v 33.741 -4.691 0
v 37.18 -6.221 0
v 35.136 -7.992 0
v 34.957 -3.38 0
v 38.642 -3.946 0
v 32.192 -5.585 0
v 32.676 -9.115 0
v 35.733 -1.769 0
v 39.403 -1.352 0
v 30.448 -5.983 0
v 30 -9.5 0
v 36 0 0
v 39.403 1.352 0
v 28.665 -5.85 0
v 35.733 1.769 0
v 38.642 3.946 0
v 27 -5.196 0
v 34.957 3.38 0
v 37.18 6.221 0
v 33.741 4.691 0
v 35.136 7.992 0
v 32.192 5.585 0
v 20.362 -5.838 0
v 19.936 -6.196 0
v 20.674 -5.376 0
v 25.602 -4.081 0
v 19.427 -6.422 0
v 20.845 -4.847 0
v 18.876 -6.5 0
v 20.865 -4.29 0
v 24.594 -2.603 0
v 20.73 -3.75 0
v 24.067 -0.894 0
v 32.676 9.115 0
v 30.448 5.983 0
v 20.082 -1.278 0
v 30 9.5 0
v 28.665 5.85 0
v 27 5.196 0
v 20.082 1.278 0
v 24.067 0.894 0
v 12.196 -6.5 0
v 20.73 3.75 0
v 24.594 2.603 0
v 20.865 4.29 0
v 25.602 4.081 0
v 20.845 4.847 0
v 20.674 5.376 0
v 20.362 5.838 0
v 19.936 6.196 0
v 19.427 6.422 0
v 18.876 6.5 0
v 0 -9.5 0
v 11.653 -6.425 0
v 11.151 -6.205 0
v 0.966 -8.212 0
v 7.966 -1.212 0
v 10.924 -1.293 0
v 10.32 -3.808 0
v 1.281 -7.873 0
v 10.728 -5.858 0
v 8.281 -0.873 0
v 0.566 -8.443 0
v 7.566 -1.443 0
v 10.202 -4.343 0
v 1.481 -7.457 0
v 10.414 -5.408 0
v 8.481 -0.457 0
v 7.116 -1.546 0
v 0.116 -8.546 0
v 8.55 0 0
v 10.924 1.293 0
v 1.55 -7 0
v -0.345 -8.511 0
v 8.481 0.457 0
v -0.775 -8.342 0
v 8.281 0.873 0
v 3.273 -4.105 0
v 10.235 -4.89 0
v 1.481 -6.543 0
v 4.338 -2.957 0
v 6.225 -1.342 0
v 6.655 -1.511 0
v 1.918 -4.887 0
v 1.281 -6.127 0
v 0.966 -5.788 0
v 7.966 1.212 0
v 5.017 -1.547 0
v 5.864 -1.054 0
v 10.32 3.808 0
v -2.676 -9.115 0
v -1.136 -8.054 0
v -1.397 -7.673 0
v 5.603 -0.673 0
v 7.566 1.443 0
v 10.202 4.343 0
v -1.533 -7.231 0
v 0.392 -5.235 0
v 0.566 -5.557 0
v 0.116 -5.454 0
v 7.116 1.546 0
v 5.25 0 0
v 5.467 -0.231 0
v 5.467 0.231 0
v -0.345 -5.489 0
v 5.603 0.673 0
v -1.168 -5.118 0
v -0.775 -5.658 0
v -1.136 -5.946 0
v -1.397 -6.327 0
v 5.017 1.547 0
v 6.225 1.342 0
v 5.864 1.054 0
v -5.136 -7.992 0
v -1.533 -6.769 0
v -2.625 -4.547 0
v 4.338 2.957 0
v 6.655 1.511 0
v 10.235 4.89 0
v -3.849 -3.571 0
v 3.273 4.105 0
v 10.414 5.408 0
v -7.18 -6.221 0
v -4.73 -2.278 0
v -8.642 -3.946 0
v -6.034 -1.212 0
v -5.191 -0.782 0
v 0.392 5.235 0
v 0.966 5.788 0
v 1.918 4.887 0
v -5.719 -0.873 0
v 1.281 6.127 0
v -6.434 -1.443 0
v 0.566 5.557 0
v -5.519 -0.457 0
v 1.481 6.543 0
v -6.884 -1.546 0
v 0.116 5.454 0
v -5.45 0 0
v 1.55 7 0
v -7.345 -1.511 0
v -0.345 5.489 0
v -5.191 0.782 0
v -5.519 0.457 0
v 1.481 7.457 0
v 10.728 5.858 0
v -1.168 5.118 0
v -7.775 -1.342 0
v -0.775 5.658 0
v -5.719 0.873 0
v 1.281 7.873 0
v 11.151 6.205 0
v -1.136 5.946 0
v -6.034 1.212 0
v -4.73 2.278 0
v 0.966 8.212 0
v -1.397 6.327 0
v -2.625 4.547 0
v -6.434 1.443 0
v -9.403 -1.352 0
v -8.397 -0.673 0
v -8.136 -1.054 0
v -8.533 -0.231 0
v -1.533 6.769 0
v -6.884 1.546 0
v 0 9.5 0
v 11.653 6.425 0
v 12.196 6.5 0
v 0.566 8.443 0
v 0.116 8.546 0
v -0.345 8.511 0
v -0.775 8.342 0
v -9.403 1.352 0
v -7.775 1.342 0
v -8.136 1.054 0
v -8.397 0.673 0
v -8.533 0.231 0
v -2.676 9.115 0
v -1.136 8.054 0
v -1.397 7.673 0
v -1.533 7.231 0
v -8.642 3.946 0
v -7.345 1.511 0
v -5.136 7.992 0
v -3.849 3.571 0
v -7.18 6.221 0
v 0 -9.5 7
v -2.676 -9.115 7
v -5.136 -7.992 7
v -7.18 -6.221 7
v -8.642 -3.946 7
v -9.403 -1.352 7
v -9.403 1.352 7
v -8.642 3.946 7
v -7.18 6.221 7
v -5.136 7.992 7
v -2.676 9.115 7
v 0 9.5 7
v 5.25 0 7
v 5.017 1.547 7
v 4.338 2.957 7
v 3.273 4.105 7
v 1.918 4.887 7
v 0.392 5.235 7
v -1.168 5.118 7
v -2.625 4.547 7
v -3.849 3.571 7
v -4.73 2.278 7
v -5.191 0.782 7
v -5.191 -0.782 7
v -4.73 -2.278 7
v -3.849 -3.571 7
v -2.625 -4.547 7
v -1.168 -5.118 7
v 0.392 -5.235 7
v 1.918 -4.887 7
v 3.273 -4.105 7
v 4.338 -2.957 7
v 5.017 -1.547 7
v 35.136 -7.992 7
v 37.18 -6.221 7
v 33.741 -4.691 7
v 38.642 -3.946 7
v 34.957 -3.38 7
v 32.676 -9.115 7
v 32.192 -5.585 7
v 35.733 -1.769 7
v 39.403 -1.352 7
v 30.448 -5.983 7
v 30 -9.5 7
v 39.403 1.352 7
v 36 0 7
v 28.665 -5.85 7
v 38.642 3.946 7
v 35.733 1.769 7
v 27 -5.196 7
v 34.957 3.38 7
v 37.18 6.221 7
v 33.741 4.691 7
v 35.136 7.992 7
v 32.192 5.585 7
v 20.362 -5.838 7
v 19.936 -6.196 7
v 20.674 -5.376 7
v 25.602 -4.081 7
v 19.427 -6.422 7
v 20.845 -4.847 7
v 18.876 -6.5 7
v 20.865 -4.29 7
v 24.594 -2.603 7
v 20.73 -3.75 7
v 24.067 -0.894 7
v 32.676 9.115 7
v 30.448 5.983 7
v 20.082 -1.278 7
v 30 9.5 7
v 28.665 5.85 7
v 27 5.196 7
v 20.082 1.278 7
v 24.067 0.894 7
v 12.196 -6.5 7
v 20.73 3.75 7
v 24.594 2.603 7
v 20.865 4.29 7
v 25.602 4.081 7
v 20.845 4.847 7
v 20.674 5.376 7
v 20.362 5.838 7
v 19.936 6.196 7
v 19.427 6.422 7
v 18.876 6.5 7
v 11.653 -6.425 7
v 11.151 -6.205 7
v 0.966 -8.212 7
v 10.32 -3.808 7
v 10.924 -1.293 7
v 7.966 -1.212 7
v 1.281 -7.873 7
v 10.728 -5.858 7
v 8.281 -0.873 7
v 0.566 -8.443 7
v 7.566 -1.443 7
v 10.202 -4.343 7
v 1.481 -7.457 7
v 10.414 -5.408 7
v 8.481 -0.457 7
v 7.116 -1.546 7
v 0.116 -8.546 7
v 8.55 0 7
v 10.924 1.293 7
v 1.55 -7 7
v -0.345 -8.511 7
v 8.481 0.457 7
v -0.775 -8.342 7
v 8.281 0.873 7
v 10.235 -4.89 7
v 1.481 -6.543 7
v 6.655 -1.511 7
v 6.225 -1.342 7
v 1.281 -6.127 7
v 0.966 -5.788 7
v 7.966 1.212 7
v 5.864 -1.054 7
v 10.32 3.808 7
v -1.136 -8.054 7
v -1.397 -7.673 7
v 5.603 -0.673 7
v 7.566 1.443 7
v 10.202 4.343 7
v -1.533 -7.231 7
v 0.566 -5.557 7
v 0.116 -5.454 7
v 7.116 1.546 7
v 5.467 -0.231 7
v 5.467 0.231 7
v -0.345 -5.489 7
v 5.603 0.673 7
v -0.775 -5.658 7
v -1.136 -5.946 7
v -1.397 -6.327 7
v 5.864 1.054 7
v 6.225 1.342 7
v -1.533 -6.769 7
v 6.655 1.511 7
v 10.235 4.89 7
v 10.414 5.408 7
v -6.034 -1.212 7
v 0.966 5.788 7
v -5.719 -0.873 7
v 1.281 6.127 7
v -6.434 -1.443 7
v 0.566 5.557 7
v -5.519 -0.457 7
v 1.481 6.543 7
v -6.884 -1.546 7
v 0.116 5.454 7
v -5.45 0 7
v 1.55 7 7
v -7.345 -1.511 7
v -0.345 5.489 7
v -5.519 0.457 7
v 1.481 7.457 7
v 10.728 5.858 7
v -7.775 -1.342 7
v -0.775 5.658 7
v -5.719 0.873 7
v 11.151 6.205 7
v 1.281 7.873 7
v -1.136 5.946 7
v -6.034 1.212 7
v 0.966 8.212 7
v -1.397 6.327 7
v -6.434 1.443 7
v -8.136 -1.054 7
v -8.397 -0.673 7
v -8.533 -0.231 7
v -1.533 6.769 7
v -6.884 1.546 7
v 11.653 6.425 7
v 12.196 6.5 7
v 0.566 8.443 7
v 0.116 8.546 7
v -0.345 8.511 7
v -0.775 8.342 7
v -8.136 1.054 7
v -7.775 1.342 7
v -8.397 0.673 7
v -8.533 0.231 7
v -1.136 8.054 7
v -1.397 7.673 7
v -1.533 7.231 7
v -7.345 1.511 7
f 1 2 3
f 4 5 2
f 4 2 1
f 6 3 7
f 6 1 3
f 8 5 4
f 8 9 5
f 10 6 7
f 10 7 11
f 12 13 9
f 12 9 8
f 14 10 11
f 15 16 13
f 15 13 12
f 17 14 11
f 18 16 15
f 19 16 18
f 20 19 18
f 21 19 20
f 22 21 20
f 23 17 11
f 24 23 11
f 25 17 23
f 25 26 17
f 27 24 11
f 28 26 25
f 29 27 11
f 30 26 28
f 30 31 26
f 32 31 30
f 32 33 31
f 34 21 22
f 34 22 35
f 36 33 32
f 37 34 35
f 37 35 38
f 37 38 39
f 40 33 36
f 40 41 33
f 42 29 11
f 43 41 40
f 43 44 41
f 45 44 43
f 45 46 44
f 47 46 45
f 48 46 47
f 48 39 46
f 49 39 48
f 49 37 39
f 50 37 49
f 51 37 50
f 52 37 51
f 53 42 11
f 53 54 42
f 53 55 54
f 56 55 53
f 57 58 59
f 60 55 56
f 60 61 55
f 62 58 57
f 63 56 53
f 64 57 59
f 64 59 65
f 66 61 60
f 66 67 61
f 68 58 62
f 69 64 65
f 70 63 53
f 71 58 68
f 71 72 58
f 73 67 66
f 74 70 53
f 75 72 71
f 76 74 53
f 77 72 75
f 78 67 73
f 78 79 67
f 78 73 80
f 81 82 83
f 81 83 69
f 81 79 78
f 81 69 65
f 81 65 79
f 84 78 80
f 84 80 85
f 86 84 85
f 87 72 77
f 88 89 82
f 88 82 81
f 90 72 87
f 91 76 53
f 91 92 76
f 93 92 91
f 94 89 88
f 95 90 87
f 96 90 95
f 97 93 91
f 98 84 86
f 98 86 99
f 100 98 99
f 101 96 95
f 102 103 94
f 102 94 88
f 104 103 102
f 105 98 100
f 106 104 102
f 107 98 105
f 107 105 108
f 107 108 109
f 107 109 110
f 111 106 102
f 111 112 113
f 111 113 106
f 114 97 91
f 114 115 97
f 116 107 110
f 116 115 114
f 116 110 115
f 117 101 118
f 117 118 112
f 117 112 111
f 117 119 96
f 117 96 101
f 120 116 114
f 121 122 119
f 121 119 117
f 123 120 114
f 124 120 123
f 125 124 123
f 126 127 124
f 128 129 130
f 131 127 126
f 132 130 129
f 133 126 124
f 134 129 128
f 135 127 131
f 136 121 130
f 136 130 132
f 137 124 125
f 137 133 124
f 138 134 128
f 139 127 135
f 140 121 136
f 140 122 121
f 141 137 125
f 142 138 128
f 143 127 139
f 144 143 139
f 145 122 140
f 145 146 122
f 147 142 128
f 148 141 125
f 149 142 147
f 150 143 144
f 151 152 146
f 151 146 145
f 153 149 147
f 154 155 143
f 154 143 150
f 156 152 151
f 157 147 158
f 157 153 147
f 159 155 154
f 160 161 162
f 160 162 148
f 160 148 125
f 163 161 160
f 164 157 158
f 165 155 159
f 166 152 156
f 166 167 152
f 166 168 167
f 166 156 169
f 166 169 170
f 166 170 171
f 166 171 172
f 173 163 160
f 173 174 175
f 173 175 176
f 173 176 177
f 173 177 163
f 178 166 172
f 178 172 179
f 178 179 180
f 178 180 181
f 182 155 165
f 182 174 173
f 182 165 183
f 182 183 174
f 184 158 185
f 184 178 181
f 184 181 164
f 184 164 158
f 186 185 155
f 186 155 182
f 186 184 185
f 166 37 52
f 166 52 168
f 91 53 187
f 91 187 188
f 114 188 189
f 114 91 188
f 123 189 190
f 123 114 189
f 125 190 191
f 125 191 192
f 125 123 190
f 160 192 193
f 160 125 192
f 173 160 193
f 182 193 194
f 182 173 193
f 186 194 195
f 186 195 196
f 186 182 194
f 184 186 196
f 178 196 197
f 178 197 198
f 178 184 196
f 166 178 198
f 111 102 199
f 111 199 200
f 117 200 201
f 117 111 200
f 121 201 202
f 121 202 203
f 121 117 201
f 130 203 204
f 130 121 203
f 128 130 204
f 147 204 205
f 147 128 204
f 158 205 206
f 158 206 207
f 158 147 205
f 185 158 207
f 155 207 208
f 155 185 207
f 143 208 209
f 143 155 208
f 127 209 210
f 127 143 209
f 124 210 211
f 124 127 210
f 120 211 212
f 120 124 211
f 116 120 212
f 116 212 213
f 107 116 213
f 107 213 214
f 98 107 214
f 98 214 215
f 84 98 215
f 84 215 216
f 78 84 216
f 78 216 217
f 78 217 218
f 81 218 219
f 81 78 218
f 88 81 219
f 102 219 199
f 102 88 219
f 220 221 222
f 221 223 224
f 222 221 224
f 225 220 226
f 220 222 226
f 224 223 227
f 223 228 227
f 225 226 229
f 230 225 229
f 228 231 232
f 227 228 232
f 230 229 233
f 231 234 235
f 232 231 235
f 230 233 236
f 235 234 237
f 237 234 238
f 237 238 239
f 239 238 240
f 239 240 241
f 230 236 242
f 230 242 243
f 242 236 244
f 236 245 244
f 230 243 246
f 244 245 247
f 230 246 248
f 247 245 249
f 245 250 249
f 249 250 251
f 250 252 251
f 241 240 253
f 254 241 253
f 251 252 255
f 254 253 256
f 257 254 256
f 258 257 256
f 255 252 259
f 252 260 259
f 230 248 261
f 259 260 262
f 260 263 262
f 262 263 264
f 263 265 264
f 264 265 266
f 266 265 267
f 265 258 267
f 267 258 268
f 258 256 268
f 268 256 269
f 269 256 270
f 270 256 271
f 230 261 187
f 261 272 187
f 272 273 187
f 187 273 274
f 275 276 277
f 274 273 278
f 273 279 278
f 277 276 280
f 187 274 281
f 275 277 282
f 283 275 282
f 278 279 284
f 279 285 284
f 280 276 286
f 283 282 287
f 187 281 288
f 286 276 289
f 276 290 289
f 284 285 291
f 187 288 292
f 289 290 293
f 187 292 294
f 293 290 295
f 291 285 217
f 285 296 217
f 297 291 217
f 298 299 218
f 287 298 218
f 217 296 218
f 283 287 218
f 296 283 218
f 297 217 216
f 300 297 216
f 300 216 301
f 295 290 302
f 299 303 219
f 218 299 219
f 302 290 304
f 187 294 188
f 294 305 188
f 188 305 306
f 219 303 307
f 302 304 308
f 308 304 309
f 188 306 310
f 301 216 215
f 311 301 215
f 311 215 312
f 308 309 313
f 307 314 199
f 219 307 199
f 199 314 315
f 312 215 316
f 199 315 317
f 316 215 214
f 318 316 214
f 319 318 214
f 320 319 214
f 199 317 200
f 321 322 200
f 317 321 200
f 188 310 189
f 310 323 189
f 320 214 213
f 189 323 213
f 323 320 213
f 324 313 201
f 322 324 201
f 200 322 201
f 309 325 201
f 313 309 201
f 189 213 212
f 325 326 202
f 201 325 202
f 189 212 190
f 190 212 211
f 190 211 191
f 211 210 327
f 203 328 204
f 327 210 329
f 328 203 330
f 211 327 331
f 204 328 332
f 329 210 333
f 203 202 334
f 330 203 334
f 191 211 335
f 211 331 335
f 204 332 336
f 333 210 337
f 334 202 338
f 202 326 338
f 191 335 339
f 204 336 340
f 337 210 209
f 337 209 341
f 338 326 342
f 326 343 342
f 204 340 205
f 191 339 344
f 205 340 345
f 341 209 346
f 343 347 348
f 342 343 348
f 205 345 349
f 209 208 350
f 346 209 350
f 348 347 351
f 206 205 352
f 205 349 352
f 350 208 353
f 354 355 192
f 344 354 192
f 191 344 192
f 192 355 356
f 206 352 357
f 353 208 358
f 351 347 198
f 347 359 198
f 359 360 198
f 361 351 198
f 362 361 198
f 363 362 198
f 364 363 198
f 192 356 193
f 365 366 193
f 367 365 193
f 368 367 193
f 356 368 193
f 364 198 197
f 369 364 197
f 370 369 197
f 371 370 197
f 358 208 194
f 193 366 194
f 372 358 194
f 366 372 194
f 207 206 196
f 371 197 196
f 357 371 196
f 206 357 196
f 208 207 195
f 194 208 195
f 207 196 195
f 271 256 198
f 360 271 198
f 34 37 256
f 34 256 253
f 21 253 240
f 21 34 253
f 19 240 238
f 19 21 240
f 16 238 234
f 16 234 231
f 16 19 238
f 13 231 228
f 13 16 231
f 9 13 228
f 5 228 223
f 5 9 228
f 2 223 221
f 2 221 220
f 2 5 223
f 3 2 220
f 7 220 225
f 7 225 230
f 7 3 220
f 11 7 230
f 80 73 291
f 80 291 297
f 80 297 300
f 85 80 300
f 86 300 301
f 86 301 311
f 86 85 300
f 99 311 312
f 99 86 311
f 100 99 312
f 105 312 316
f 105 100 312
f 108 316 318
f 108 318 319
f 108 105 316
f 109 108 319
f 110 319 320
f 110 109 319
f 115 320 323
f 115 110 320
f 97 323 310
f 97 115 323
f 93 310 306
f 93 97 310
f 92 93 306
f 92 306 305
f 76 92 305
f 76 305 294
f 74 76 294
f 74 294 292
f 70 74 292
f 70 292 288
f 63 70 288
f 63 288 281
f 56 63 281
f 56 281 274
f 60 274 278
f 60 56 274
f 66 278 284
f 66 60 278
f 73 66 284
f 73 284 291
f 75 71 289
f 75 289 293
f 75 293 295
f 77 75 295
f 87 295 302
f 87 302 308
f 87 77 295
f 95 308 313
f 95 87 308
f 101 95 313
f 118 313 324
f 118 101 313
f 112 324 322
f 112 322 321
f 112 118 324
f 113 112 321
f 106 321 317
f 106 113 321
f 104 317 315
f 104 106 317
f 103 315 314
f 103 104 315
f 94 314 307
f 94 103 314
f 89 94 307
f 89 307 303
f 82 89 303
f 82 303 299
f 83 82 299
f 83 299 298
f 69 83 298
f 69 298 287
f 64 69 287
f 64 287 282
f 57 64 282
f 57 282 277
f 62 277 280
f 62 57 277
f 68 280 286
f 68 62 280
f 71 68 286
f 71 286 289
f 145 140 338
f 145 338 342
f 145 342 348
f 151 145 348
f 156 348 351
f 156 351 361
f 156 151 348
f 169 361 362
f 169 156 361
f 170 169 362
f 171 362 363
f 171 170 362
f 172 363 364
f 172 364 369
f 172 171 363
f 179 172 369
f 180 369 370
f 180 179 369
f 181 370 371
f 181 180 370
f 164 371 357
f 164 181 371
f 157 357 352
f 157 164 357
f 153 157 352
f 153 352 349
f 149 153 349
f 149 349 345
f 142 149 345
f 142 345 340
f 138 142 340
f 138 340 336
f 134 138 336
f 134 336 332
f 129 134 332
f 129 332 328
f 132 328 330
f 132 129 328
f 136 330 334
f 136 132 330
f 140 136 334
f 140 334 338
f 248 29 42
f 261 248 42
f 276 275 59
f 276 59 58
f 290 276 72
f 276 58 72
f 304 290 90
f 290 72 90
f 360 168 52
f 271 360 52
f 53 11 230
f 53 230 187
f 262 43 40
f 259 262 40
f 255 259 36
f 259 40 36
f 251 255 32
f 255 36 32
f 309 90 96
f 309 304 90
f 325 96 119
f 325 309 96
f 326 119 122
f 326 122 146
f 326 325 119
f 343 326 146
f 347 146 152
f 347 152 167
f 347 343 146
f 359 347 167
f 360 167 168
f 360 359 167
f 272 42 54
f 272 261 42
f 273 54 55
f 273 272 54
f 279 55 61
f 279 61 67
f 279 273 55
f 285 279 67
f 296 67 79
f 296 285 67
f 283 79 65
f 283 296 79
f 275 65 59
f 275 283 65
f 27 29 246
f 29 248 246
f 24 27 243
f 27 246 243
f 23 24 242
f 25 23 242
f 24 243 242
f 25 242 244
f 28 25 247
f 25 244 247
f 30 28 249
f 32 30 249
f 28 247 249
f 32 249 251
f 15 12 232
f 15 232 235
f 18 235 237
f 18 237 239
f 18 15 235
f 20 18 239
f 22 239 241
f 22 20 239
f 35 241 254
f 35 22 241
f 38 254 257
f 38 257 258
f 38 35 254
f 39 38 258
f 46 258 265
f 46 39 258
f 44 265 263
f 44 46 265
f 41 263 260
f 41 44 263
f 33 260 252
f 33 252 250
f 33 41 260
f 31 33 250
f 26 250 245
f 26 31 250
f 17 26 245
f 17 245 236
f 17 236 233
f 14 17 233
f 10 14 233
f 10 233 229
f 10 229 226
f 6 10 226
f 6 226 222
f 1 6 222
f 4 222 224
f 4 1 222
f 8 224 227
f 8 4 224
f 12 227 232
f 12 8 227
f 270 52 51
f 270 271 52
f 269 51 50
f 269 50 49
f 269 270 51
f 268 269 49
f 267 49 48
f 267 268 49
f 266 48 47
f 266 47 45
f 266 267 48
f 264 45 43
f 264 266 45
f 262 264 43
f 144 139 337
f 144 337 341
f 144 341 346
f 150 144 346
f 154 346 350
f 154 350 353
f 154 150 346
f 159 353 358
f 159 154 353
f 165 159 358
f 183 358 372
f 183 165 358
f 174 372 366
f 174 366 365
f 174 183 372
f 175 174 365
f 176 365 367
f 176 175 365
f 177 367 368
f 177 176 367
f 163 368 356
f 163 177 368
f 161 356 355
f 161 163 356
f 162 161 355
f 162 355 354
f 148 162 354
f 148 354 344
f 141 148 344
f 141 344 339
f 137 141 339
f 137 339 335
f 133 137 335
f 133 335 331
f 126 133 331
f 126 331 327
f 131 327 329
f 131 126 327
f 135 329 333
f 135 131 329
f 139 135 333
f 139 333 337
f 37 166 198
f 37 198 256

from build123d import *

# Parameters (mm, degrees)
SKETCH_1_R      = 5.25
SKETCH_1_R_2    = 6
SKETCH_1_R_3    = 1.55
EXTRUDE_1_DEPTH = 7
FILLET_1_R      = 2


with BuildPart() as part:
    # 草图1 → 凸台-拉伸1 (new body)
    with BuildSketch(Plane.XY):
        with BuildLine():
            Line((0, 9.5), (30, 9.5))
            ThreePointArc((30, 9.5), (39.5, 0), (30, -9.5))
            Line((30, -9.5), (0, -9.5))
            ThreePointArc((0, -9.5), (-9.5, 0), (0, 9.5))
        make_face()
        Circle(SKETCH_1_R, mode=Mode.SUBTRACT)
        with Locations((30, 0)):
            Circle(SKETCH_1_R_2, mode=Mode.SUBTRACT)
        with Locations((0, -7)):
            Circle(SKETCH_1_R_3, mode=Mode.SUBTRACT)
        with Locations((-7, 0)):
            Circle(SKETCH_1_R_3, mode=Mode.SUBTRACT)
        with Locations((0, 7)):
            Circle(SKETCH_1_R_3, mode=Mode.SUBTRACT)
        with Locations((7, 0)):
            Circle(SKETCH_1_R_3, mode=Mode.SUBTRACT)
        with BuildLine():
            Line((22.400657923, -6.5), (8.874119675, -6.5))
            ThreePointArc((8.874119675, -6.5), (11, 0), (8.874119675, 6.5))
            Line((8.874119675, 6.5), (22.400657923, 6.5))
            ThreePointArc((22.400657923, 6.5), (20, 0), (22.400657923, -6.5))
        make_face(mode=Mode.SUBTRACT)
    extrude(amount=EXTRUDE_1_DEPTH)

    # 圆角1
    fillet_1_edges = [part.edges().sort_by_distance(p)[0] for p in [
        (22.400657923, -6.5, 3.5),
        (22.400657923, 6.5, 3.5),
        (8.874119675, 6.5, 3.5),
        (8.874119675, -6.5, 3.5),
    ]]
    fillet(fillet_1_edges, radius=FILLET_1_R)


solid = part.part
